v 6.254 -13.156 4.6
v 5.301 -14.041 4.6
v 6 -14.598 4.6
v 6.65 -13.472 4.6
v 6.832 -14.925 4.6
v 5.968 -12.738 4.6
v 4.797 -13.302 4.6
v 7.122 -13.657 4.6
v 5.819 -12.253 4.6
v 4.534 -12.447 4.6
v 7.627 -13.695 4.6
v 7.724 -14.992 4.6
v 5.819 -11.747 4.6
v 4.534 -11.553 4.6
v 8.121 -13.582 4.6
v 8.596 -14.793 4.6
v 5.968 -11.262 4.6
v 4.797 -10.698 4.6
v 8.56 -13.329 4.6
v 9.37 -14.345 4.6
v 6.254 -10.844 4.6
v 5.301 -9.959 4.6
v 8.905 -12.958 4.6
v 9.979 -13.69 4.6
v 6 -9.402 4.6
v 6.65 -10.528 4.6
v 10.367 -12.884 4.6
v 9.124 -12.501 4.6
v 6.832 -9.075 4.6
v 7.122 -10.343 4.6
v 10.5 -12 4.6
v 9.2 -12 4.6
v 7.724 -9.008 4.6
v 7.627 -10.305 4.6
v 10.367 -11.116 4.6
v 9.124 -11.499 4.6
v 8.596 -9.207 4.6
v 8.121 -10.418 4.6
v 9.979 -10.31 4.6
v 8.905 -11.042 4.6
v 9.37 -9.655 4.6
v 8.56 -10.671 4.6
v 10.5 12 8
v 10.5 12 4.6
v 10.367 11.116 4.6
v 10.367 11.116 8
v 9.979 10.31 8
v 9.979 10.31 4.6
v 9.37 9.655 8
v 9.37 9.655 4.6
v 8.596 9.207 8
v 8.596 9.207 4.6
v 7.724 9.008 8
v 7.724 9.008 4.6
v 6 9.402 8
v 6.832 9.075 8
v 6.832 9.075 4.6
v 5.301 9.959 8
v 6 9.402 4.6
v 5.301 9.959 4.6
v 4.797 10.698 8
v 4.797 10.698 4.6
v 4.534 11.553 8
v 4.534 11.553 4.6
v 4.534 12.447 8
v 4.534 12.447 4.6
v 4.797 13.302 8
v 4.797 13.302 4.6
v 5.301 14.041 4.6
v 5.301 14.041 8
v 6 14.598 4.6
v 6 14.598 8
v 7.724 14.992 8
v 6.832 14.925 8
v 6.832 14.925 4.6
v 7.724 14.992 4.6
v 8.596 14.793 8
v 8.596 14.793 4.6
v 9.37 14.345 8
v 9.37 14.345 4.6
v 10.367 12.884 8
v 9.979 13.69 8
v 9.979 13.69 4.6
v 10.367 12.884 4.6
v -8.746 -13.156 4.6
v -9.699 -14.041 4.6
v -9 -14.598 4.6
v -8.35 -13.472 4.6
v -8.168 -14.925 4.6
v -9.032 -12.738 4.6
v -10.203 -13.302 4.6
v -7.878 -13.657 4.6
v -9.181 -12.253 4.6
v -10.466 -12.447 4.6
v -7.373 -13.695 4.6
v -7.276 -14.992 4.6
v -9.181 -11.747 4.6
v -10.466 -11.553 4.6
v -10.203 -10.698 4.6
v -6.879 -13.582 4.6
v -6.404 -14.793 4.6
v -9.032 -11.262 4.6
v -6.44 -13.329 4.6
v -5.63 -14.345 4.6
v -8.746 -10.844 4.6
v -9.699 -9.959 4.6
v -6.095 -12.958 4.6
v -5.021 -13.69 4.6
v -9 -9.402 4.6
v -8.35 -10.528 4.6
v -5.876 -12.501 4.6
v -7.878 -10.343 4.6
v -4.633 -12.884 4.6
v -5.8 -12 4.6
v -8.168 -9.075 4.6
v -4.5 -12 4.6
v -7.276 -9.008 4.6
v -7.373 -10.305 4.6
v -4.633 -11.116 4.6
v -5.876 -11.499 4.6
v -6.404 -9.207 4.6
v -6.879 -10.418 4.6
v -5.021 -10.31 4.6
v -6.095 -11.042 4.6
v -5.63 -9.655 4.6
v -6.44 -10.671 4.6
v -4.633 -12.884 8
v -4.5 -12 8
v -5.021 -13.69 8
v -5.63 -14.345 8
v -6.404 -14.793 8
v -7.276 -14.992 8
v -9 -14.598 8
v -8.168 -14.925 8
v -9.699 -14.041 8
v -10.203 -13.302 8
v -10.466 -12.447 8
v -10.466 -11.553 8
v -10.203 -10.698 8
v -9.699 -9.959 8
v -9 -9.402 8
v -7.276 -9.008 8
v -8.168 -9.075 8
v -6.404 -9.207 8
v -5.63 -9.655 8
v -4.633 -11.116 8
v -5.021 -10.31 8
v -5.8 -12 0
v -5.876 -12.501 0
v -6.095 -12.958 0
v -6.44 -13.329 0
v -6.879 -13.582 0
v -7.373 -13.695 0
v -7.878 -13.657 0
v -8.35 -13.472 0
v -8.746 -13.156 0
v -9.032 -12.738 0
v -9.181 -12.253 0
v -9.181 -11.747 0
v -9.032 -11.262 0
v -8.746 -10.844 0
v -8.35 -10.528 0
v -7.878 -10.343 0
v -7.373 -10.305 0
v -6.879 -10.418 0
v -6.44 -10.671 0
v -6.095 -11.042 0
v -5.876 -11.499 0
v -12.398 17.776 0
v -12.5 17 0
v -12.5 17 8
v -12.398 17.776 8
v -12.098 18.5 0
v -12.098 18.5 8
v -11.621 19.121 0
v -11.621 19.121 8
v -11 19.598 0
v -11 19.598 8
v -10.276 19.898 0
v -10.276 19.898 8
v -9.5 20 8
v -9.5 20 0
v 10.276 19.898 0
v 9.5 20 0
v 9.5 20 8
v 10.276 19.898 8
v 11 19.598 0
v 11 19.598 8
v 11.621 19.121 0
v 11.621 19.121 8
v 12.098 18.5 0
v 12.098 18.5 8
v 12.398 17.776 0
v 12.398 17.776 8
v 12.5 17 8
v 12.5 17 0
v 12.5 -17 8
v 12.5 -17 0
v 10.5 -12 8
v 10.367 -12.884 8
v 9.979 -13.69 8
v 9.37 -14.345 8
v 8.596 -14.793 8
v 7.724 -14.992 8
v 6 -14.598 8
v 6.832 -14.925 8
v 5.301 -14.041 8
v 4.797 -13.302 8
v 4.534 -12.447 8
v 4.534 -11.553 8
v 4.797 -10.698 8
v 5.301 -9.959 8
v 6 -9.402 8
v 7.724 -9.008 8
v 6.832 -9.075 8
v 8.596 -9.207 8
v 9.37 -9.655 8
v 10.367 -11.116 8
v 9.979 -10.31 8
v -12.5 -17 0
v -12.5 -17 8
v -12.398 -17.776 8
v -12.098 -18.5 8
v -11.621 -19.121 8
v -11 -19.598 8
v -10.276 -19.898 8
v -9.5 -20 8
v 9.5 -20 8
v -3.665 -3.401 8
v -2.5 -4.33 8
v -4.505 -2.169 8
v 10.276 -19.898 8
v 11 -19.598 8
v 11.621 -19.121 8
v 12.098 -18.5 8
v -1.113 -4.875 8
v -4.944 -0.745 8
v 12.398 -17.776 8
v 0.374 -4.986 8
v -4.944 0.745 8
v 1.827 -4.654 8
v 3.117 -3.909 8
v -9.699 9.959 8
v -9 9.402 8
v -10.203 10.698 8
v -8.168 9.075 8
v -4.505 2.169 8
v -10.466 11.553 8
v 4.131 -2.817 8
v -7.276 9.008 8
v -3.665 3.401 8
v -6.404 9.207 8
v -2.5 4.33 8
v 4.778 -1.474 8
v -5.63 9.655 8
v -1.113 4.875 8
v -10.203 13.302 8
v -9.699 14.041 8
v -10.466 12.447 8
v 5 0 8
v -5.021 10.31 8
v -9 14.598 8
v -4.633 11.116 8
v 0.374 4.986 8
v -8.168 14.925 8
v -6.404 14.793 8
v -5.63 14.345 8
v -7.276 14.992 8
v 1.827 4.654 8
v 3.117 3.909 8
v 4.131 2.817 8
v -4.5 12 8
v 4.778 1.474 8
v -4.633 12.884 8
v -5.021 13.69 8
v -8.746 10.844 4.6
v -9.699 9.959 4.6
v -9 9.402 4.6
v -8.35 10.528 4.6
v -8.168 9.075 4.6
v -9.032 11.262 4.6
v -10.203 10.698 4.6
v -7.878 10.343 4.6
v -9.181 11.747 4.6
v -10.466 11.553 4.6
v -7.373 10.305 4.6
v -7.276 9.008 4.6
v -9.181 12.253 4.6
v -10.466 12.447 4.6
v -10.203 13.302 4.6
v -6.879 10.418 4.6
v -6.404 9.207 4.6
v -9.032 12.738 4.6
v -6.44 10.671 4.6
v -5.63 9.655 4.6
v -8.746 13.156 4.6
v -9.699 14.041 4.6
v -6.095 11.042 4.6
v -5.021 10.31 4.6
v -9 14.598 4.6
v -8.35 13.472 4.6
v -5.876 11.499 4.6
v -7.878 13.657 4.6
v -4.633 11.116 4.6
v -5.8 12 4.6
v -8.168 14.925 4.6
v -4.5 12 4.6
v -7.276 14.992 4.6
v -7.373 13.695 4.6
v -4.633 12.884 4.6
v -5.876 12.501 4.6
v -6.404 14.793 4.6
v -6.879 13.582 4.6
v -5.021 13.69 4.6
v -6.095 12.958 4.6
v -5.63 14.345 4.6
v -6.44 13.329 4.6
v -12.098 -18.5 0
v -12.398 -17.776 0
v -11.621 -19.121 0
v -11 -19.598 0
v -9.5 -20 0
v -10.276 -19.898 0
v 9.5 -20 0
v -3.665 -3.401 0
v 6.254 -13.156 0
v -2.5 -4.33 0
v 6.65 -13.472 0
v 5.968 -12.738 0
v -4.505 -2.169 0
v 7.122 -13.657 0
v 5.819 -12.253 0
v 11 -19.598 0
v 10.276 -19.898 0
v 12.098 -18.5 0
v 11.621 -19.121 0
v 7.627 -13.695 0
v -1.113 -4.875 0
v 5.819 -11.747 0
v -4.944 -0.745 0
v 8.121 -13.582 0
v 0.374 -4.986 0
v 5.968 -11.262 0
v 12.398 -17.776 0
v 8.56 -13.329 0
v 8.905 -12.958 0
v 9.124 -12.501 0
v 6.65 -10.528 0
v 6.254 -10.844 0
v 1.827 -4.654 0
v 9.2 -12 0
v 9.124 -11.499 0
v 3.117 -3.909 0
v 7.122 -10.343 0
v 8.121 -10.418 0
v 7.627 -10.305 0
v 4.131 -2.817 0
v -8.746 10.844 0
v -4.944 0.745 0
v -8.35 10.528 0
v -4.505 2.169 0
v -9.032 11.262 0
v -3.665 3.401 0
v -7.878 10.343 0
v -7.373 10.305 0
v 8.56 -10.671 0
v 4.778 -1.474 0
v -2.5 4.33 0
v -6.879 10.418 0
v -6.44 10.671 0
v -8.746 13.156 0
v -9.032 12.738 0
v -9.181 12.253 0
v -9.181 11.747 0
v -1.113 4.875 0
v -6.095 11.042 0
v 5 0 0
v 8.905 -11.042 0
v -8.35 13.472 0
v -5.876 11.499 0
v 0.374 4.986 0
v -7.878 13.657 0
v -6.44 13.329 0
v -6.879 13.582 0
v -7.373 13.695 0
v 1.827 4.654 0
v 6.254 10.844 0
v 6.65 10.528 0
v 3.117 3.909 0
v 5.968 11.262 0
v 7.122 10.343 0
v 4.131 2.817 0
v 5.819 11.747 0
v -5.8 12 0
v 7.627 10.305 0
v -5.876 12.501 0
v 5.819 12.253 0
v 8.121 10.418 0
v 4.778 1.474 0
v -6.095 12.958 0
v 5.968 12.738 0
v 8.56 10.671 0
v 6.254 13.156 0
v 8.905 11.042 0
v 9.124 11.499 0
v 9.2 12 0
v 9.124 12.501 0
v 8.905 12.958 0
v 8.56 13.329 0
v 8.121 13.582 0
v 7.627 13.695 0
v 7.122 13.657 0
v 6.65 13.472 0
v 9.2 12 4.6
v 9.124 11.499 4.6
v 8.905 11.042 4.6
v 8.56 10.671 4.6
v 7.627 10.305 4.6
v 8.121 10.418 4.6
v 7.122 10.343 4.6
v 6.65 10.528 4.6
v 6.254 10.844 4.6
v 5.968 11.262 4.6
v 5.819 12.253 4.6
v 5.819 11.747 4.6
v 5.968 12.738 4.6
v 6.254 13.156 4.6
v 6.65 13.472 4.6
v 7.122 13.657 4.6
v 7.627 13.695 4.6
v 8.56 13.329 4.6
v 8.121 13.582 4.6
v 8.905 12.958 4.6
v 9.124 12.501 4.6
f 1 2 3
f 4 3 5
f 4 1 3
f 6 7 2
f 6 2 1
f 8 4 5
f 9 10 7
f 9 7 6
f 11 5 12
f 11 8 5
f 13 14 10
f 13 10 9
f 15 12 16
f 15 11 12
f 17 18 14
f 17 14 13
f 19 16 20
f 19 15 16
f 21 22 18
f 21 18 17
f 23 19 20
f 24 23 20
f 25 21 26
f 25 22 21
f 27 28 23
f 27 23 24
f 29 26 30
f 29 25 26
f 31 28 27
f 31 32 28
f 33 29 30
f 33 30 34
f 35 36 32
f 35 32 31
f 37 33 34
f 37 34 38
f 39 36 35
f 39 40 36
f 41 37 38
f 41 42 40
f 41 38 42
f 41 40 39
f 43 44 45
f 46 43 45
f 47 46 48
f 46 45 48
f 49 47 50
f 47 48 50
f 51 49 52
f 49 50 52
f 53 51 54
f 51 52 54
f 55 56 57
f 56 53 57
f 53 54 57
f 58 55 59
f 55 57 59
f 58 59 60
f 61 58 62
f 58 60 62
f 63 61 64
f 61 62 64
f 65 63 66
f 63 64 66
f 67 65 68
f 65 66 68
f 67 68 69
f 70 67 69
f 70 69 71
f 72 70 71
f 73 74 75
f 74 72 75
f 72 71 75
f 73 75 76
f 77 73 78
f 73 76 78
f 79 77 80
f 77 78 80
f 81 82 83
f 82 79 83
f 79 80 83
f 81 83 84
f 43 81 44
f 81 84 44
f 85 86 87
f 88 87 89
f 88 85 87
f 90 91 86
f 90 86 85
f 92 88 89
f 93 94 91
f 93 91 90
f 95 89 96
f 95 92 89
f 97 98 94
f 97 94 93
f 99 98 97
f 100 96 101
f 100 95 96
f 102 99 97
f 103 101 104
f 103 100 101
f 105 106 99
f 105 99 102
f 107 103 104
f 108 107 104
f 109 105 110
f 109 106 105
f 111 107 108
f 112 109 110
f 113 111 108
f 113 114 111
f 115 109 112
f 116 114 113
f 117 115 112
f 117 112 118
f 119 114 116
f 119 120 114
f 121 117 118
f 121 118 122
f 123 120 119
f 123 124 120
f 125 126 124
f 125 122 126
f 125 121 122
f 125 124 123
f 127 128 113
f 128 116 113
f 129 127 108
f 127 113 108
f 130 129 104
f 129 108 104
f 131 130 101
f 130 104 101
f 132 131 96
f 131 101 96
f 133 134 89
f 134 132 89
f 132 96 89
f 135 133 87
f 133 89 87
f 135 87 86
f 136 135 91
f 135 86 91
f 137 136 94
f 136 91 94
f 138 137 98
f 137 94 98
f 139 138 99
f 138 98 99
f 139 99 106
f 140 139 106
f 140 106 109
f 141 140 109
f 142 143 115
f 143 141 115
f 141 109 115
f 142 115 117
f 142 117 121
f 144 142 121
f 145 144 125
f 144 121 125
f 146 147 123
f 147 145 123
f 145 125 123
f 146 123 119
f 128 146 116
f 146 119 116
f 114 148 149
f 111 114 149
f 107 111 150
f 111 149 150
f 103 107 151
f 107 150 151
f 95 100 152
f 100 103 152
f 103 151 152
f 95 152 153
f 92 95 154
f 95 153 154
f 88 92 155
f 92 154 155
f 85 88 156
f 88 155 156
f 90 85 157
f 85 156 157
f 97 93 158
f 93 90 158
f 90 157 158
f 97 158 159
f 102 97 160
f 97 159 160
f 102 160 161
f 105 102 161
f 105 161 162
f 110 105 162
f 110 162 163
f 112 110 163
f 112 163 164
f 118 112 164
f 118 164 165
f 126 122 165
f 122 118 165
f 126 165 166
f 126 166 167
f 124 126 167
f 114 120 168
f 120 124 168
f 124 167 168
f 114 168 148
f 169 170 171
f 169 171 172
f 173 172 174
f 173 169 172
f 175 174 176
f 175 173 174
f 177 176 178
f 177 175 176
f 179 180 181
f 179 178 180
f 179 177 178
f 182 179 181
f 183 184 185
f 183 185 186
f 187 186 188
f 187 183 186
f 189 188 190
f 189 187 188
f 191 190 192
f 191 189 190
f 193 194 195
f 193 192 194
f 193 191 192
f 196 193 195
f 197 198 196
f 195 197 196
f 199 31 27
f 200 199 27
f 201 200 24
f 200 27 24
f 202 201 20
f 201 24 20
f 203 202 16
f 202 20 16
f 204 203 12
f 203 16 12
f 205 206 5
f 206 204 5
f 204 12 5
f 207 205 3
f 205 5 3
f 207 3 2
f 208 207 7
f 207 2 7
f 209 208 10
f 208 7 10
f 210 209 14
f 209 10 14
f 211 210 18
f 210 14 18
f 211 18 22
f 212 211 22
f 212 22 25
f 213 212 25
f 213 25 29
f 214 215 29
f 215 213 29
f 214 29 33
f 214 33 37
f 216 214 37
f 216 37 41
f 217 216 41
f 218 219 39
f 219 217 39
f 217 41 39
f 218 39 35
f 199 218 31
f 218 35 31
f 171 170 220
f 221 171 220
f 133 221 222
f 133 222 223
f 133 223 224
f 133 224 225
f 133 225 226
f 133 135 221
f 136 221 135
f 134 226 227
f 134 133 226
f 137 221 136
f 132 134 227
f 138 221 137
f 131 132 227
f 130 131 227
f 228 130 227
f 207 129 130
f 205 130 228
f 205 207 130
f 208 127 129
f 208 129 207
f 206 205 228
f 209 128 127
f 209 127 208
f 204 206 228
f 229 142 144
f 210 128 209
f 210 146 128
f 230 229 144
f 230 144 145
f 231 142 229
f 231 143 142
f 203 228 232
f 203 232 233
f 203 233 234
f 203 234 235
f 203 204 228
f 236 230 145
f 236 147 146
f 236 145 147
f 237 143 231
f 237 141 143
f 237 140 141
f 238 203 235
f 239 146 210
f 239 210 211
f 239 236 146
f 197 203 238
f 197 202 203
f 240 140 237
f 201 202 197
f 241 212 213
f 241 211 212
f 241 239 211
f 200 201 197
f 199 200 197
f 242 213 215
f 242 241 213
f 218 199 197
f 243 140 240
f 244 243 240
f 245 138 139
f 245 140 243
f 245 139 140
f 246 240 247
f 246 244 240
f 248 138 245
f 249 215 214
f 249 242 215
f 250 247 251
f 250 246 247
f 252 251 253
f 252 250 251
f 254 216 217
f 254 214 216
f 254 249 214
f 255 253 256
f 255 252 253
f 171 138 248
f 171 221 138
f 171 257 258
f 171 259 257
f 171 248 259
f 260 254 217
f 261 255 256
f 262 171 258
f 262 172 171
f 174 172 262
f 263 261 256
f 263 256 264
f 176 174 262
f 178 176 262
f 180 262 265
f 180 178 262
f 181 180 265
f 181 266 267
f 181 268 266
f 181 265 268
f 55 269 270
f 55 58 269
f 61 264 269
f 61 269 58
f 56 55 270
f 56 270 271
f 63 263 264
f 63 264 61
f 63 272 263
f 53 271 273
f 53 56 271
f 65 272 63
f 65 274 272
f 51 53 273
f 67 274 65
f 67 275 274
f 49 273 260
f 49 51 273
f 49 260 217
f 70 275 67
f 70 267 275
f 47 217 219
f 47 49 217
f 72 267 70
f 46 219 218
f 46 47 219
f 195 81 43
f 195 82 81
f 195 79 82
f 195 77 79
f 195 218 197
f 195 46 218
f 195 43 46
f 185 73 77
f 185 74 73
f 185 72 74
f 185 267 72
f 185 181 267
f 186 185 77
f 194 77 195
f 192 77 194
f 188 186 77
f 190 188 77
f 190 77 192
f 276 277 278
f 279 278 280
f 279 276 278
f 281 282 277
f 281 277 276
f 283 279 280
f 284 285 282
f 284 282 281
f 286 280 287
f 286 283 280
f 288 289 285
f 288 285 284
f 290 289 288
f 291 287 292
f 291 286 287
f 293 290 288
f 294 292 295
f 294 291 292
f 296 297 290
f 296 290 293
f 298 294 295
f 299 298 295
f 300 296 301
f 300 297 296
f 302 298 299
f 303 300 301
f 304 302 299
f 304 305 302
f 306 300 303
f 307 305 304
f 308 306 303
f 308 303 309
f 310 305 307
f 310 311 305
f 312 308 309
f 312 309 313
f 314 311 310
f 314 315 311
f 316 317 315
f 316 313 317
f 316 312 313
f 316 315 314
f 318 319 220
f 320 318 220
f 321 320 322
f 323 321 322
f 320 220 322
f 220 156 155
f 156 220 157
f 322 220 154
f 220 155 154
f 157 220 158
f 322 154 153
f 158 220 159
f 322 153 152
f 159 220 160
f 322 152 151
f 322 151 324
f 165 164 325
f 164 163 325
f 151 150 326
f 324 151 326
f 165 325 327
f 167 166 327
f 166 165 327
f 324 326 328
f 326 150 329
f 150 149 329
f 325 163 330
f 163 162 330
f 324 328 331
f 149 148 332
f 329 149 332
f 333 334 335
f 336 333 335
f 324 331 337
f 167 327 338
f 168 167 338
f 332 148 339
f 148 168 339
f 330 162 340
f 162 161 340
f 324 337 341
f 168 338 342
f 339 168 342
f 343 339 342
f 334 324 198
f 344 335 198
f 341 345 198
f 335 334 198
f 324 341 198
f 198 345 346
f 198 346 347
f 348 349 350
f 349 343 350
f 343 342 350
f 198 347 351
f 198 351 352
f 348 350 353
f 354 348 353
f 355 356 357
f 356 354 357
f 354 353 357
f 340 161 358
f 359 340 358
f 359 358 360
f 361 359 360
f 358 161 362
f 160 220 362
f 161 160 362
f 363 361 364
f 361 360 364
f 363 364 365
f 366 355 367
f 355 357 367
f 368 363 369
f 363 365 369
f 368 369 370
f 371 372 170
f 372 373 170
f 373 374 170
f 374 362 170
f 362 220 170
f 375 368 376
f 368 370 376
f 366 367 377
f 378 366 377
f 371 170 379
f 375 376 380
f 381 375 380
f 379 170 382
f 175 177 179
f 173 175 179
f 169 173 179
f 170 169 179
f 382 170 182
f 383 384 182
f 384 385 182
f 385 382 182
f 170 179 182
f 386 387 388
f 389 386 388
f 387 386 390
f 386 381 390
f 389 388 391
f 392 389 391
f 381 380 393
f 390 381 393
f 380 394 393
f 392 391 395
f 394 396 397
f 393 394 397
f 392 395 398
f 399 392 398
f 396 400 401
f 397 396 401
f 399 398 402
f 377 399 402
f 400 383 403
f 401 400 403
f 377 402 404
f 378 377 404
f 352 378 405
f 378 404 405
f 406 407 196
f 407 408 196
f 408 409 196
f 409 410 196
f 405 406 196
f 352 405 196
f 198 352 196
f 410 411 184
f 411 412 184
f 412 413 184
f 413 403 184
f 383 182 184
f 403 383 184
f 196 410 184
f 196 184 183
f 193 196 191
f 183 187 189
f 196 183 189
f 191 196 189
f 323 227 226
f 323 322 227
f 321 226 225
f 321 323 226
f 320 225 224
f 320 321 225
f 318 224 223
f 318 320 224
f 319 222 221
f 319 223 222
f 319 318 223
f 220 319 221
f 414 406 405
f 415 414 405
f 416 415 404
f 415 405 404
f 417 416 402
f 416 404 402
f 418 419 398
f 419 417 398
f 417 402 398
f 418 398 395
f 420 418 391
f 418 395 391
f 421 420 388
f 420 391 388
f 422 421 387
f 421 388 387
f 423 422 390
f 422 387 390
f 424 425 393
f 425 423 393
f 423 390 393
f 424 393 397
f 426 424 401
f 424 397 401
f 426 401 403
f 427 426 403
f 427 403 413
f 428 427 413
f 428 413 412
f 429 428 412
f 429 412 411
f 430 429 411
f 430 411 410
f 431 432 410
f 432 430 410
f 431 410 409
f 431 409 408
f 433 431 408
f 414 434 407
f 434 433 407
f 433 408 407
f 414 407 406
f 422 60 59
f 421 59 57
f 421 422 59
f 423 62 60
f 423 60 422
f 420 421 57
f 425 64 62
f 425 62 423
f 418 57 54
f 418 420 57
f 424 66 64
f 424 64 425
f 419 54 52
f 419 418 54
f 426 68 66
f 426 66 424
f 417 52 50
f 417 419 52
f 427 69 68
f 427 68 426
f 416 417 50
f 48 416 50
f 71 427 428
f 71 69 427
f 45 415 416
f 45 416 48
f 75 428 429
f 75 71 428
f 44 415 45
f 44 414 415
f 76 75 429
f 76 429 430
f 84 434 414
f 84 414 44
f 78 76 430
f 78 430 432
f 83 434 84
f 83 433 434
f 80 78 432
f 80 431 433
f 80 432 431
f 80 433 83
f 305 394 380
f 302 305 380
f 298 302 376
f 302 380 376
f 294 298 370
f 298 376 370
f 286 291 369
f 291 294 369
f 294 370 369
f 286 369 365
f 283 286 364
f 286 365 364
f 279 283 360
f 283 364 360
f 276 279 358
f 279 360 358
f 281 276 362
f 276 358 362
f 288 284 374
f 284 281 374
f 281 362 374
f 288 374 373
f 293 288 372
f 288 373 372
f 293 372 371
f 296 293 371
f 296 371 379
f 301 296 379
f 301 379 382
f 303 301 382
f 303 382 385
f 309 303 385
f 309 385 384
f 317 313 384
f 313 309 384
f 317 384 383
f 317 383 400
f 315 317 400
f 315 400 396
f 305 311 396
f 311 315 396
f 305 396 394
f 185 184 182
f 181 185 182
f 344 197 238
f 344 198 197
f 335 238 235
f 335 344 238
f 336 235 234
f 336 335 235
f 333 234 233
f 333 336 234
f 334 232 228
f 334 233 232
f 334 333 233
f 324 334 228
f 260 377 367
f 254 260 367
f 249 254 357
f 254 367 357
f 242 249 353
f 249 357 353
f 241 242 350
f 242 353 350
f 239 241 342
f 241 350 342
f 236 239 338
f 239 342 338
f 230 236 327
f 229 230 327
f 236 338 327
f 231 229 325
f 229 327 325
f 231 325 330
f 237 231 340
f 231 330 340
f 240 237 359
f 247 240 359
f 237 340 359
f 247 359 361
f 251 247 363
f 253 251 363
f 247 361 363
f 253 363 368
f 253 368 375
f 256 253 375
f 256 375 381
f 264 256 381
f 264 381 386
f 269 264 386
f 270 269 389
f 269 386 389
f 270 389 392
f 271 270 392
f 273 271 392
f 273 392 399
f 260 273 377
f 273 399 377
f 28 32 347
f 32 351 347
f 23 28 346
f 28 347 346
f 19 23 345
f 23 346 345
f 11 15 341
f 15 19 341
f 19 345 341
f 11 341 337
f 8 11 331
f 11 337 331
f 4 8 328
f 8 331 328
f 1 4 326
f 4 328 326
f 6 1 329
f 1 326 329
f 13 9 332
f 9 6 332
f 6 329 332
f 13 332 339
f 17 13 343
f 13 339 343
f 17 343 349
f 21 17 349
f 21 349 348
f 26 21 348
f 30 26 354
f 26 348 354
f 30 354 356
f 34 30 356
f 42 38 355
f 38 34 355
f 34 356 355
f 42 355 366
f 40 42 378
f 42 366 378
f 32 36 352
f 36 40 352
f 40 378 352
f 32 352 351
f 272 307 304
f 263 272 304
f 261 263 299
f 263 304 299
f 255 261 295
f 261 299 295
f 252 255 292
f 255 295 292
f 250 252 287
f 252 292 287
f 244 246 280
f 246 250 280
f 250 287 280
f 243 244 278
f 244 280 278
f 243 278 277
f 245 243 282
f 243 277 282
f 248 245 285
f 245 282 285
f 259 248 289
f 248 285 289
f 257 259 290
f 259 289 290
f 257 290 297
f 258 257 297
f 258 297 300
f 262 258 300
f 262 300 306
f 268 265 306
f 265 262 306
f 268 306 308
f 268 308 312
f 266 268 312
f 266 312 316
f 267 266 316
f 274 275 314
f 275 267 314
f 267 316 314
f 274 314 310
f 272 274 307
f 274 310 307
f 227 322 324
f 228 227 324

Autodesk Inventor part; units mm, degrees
ref_plane "YZ Plane" through (0, 0, 0) normal (1, 0, 0) x (0, 1, 0)
ref_plane "XZ Plane" through (0, 0, 0) normal (0, 1, 0) x (-1, 0, 0)
ref_plane "XY Plane" through (0, 0, 0) normal (0, 0, 1) x (1, 0, 0)
sketch "Skizze2" plane through (0, 0, 0) normal (0, 0, 1) x (1, 0, 0)
  line L0 (-9.5, -20) -> (9.5, -20)
  line L1 (12.5, -17) -> (12.5, 17)
  line L2 (9.5, 20) -> (-9.5, 20)
  line L3 (-12.5, 17) -> (-12.5, -17)
  line L4 (-12.5, -20) -> (12.5, 20) construction
  line L5 (12.5, -20) -> (-12.5, 20) construction
  circle A0 centre (0, 0) radius 5
  circle A1 centre (7.5, -12) radius 1.7
  circle A2 centre (-7.5, -12) radius 1.7
  circle A3 centre (7.5, 12) radius 1.7
  circle A4 centre (-7.5, 12) radius 1.7
  circle A5 centre (-7.5, 12) radius 3
  circle A6 centre (7.5, 12) radius 3
  circle A7 centre (7.5, -12) radius 3
  circle A8 centre (-7.5, -12) radius 3
  arc A9 (-12.5, -17) -> (-9.5, -20) centre (-9.5, -17) ccw
  arc A10 (9.5, -20) -> (12.5, -17) centre (9.5, -17) ccw
  arc A11 (12.5, 17) -> (9.5, 20) centre (9.5, 17) ccw
  arc A12 (-9.5, 20) -> (-12.5, 17) centre (-9.5, 17) ccw
  dimension "d0" = 40
  dimension "d1" = 25
  dimension "d9" = 10
  dimension "d11" = 3.4
  dimension "d12" = 3.4
  dimension "d13" = 3.4
  dimension "d14" = 3.4
  dimension "d15" = 15
  dimension "d16" = 24
  dimension "d17" = 6
  dimension "d18" = 6
  dimension "d19" = 6
  dimension "d20" = 6
  dimension "d21" = 3
extrude "Extrusion1" add sketch "Skizze2" along normal blind 8 contours A9 L3 A12 L2 A11 L1 A10 L0 | A0
extrude "Extrusion3" add sketch "Skizze2" along normal blind 4.6 contours A5 | A6 | A7 | A8
extrude "Extrusion4" cut sketch "Skizze2" along normal through all contours A0
properties part number "Adapterplatte_Focus"
